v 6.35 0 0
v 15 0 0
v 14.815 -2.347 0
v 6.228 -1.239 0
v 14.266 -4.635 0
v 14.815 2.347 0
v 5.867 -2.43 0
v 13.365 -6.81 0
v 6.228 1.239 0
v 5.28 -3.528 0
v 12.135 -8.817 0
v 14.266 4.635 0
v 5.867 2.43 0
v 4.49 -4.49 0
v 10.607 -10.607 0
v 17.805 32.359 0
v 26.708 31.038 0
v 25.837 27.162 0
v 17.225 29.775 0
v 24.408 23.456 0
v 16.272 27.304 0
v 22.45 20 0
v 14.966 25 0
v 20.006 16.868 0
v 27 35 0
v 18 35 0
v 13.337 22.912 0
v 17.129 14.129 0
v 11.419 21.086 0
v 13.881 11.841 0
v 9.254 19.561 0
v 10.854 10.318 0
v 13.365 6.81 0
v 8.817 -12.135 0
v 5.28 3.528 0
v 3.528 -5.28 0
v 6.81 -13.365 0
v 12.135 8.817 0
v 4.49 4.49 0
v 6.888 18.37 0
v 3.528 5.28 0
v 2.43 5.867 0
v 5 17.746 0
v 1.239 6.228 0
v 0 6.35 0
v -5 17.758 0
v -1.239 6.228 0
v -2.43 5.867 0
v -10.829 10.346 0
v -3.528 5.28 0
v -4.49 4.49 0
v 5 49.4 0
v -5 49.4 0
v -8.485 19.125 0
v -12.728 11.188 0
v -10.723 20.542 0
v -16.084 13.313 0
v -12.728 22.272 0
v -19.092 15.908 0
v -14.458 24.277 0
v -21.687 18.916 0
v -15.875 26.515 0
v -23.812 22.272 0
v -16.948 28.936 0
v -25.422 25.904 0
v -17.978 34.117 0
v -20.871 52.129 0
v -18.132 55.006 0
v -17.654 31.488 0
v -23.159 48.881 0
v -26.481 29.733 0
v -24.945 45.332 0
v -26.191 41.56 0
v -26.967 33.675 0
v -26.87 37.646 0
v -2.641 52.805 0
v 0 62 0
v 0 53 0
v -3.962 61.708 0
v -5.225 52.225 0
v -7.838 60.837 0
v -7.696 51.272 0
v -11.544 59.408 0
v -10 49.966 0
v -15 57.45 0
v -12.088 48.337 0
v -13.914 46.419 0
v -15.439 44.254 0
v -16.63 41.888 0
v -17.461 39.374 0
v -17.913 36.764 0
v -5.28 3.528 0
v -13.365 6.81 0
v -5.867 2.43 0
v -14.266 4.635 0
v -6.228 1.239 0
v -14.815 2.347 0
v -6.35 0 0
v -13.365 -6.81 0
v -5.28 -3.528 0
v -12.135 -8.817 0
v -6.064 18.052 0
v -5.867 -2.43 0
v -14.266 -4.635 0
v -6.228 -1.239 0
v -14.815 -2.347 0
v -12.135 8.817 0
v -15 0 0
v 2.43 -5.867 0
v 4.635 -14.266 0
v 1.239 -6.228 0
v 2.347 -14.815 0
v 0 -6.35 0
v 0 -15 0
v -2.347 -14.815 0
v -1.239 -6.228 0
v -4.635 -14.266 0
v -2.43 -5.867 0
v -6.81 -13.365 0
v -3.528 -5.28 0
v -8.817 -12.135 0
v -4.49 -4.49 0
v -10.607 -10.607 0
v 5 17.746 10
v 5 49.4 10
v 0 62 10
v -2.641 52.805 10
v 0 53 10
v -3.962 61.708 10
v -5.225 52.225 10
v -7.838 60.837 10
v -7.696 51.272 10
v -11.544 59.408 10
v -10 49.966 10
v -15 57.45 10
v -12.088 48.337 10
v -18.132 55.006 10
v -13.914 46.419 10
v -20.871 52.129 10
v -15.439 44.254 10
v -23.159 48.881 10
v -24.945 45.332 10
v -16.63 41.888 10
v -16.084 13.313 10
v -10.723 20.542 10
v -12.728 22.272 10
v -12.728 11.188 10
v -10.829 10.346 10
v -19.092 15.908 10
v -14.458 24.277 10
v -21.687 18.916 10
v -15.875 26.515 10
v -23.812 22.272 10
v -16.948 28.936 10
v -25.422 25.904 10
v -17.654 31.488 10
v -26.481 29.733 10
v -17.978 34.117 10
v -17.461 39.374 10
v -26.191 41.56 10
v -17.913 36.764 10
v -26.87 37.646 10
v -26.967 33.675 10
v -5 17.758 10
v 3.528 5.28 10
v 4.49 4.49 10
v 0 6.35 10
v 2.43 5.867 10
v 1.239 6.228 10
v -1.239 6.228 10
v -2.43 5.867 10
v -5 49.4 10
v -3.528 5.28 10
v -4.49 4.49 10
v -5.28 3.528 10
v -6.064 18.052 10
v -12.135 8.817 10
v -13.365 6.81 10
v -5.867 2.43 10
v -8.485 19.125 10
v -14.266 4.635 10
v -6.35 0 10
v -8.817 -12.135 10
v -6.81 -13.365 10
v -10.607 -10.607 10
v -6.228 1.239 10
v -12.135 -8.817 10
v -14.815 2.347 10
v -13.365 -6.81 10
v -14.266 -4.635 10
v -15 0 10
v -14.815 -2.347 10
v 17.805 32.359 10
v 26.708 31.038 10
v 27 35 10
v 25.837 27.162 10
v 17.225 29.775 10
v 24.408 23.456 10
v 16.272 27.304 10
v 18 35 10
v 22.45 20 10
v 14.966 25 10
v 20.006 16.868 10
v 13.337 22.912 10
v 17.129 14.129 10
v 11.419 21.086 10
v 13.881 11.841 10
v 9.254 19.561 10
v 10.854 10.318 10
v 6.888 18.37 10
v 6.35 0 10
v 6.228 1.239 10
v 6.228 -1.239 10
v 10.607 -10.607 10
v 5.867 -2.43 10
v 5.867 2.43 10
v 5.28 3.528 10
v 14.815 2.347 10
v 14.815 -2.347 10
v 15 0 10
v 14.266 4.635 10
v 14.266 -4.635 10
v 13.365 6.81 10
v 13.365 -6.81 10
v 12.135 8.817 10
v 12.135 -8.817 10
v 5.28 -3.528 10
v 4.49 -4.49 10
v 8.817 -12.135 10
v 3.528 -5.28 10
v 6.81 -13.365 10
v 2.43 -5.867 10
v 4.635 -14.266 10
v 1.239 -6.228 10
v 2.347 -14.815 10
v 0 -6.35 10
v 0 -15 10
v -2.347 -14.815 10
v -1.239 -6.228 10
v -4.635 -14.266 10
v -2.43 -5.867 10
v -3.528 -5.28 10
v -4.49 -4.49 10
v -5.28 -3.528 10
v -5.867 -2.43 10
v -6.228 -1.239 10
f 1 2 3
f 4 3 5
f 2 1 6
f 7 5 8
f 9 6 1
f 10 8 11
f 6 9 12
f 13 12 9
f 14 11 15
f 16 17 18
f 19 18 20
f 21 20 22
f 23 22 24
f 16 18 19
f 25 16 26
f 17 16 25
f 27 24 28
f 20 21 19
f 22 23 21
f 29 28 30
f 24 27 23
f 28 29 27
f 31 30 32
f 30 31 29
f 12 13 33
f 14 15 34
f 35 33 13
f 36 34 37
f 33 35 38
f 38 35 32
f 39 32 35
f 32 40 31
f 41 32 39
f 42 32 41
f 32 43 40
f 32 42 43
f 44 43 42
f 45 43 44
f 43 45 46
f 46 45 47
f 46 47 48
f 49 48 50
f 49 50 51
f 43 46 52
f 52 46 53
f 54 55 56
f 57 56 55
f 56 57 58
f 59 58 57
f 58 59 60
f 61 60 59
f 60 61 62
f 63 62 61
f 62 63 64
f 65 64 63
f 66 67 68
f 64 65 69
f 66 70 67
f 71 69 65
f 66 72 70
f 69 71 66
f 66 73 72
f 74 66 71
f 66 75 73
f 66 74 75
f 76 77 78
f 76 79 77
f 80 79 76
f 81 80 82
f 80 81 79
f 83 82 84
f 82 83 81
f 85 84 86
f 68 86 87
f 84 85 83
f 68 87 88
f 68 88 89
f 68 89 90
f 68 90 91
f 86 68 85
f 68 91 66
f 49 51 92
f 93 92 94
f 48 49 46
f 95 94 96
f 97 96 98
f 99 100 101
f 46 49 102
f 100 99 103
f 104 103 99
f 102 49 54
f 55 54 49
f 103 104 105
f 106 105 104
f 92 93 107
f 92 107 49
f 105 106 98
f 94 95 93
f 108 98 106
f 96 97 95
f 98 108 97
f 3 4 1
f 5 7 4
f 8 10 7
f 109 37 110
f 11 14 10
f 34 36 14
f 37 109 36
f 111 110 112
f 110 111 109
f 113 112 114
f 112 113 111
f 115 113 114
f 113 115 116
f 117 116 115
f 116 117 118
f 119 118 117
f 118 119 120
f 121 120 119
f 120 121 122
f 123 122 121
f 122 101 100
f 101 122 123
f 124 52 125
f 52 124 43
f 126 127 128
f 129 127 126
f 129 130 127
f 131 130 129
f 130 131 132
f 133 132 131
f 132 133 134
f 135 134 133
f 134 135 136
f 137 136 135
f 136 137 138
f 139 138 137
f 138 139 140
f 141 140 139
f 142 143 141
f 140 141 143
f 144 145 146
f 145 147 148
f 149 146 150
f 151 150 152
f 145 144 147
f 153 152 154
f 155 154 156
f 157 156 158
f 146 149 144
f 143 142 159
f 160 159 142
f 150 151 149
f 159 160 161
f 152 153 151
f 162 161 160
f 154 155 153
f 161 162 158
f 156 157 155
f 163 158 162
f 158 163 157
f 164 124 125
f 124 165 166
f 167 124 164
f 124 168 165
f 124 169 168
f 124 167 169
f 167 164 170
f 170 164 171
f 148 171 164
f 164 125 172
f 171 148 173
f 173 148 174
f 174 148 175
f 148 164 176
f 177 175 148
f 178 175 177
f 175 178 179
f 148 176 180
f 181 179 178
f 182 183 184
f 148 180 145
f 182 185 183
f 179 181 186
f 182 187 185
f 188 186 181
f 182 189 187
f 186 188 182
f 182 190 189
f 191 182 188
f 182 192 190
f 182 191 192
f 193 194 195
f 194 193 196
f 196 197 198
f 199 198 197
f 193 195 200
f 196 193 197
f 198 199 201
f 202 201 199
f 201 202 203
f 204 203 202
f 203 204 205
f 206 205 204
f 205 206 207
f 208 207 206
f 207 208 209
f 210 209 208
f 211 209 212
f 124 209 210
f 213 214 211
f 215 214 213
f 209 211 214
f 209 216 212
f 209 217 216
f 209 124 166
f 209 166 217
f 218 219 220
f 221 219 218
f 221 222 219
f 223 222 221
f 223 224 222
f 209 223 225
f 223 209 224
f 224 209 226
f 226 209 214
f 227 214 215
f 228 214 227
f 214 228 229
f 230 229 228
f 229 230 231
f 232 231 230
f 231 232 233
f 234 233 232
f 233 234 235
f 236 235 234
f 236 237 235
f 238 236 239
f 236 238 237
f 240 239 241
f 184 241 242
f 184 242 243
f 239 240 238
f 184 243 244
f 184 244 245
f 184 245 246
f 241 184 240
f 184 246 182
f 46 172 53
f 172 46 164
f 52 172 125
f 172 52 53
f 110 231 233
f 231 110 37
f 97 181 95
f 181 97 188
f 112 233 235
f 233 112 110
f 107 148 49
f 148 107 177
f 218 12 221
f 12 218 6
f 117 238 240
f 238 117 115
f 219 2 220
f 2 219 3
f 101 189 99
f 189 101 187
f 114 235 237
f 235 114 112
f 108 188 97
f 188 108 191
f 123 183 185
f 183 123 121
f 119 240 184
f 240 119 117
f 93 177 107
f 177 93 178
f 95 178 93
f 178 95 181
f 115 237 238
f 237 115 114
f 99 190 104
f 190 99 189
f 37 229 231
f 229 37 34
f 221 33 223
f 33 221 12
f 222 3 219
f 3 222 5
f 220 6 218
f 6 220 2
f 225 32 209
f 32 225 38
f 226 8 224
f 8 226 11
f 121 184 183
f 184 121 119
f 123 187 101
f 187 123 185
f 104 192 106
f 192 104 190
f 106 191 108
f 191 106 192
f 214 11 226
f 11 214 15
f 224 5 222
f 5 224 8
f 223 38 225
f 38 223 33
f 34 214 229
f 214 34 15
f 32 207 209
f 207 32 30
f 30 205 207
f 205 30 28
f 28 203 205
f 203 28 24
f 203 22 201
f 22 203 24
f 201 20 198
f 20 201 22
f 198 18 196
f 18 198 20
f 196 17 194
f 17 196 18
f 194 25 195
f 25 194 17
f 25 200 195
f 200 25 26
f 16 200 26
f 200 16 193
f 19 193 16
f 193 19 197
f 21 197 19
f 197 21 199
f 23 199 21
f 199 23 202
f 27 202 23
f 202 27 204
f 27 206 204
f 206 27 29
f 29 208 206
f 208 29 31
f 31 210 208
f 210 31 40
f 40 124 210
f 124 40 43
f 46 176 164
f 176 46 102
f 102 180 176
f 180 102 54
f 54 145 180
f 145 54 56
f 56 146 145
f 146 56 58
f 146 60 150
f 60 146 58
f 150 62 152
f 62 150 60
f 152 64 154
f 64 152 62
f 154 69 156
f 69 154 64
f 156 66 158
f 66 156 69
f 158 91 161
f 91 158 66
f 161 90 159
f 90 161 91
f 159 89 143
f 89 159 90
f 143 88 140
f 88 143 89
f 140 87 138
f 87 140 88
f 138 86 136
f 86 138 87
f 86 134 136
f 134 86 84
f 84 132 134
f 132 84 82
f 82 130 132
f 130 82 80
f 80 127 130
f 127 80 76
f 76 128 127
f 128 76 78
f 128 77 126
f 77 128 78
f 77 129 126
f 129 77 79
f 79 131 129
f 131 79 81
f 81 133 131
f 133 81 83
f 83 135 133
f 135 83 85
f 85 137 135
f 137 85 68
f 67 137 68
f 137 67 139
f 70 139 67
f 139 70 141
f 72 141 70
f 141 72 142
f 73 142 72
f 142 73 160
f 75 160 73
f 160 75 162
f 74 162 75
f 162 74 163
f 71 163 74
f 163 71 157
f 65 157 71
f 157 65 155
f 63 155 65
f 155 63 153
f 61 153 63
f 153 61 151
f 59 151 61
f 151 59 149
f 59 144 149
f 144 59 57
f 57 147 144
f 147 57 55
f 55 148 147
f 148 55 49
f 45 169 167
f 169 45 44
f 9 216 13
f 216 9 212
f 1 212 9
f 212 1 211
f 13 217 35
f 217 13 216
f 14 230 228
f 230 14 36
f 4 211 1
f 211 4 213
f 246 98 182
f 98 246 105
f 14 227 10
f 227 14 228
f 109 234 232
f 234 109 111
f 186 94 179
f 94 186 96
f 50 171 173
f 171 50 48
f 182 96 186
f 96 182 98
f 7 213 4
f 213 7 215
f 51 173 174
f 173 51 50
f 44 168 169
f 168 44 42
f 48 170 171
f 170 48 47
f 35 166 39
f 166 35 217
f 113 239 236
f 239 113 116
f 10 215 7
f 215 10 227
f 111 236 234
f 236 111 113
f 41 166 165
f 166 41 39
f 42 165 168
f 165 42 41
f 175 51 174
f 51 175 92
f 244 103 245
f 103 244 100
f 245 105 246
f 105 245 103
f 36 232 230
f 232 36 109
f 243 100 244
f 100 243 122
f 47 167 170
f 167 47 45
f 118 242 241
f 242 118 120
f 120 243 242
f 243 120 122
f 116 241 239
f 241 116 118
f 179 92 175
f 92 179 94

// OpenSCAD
$fn = 32;

// ----------------------------------------------------------------------
// Hook: 70 mm shank into a 18 mm curl, 10 mm thick
// ----------------------------------------------------------------------

// --- parameters (mm) ---
shank_len = 70;           // shank length from the boss centre
shank_w = 10;             // shank width
boss_d = 30;              // boss diameter
bore_d = 12.7;            // boss bore
curl_in = 18;             // curl inner radius
curl_out = 27;            // curl outer radius
curl_sweep = 270;         // curl sweep angle
hook_t = 10;              // hook thickness

shank_profile = [[-5, 49.4], [5, 49.4], [5, 13], [-5, 13]];
boss_profile = [[15, 0], [14.815, 2.347], [14.266, 4.635], [13.365, 6.81], [12.135, 8.817], [10.607, 10.607], [8.817, 12.135], [6.81, 13.365], [4.635, 14.266], [2.347, 14.815], [0, 15], [-2.347, 14.815], [-4.635, 14.266], [-6.81, 13.365], [-8.817, 12.135], [-10.607, 10.607], [-12.135, 8.817], [-13.365, 6.81], [-14.266, 4.635], [-14.815, 2.347], [-15, 0], [-14.815, -2.347], [-14.266, -4.635], [-13.365, -6.81], [-12.135, -8.817], [-10.607, -10.607], [-8.817, -12.135], [-6.81, -13.365], [-4.635, -14.266], [-2.347, -14.815], [0, -15], [2.347, -14.815], [4.635, -14.266], [6.81, -13.365], [8.817, -12.135], [10.607, -10.607], [12.135, -8.817], [13.365, -6.81], [14.266, -4.635], [14.815, -2.347]];
curl_profile = [[0, 62], [-3.962, 61.708], [-7.838, 60.837], [-11.544, 59.408], [-15, 57.45], [-18.132, 55.006], [-20.871, 52.129], [-23.159, 48.881], [-24.945, 45.332], [-26.191, 41.56], [-26.87, 37.646], [-26.967, 33.675], [-26.481, 29.733], [-25.422, 25.904], [-23.812, 22.272], [-21.687, 18.916], [-19.092, 15.908], [-16.084, 13.313], [-12.728, 11.188], [-9.096, 9.578], [-5.267, 8.519], [-1.325, 8.033], [2.646, 8.13], [6.56, 8.809], [10.332, 10.055], [13.881, 11.841], [17.129, 14.129], [20.006, 16.868], [22.45, 20], [24.408, 23.456], [25.837, 27.162], [26.708, 31.038], [27, 35], [18, 35], [17.805, 32.359], [17.225, 29.775], [16.272, 27.304], [14.966, 25], [13.337, 22.912], [11.419, 21.086], [9.254, 19.561], [6.888, 18.37], [4.374, 17.539], [1.764, 17.087], [-0.883, 17.022], [-3.512, 17.346], [-6.064, 18.052], [-8.485, 19.125], [-10.723, 20.542], [-12.728, 22.272], [-14.458, 24.277], [-15.875, 26.515], [-16.948, 28.936], [-17.654, 31.488], [-17.978, 34.117], [-17.913, 36.764], [-17.461, 39.374], [-16.63, 41.888], [-15.439, 44.254], [-13.914, 46.419], [-12.088, 48.337], [-10, 49.966], [-7.696, 51.272], [-5.225, 52.225], [-2.641, 52.805], [0, 53]];

difference() {
  union() {
    /* three overlapping outlines: shank, boss and the smooth curl */
    linear_extrude(height = hook_t) polygon(shank_profile);
    linear_extrude(height = hook_t) polygon(boss_profile);
    linear_extrude(height = hook_t) polygon(curl_profile);
  }
  translate([0, 0, -2.5]) cylinder(h = hook_t + 5, d = bore_d);
}
